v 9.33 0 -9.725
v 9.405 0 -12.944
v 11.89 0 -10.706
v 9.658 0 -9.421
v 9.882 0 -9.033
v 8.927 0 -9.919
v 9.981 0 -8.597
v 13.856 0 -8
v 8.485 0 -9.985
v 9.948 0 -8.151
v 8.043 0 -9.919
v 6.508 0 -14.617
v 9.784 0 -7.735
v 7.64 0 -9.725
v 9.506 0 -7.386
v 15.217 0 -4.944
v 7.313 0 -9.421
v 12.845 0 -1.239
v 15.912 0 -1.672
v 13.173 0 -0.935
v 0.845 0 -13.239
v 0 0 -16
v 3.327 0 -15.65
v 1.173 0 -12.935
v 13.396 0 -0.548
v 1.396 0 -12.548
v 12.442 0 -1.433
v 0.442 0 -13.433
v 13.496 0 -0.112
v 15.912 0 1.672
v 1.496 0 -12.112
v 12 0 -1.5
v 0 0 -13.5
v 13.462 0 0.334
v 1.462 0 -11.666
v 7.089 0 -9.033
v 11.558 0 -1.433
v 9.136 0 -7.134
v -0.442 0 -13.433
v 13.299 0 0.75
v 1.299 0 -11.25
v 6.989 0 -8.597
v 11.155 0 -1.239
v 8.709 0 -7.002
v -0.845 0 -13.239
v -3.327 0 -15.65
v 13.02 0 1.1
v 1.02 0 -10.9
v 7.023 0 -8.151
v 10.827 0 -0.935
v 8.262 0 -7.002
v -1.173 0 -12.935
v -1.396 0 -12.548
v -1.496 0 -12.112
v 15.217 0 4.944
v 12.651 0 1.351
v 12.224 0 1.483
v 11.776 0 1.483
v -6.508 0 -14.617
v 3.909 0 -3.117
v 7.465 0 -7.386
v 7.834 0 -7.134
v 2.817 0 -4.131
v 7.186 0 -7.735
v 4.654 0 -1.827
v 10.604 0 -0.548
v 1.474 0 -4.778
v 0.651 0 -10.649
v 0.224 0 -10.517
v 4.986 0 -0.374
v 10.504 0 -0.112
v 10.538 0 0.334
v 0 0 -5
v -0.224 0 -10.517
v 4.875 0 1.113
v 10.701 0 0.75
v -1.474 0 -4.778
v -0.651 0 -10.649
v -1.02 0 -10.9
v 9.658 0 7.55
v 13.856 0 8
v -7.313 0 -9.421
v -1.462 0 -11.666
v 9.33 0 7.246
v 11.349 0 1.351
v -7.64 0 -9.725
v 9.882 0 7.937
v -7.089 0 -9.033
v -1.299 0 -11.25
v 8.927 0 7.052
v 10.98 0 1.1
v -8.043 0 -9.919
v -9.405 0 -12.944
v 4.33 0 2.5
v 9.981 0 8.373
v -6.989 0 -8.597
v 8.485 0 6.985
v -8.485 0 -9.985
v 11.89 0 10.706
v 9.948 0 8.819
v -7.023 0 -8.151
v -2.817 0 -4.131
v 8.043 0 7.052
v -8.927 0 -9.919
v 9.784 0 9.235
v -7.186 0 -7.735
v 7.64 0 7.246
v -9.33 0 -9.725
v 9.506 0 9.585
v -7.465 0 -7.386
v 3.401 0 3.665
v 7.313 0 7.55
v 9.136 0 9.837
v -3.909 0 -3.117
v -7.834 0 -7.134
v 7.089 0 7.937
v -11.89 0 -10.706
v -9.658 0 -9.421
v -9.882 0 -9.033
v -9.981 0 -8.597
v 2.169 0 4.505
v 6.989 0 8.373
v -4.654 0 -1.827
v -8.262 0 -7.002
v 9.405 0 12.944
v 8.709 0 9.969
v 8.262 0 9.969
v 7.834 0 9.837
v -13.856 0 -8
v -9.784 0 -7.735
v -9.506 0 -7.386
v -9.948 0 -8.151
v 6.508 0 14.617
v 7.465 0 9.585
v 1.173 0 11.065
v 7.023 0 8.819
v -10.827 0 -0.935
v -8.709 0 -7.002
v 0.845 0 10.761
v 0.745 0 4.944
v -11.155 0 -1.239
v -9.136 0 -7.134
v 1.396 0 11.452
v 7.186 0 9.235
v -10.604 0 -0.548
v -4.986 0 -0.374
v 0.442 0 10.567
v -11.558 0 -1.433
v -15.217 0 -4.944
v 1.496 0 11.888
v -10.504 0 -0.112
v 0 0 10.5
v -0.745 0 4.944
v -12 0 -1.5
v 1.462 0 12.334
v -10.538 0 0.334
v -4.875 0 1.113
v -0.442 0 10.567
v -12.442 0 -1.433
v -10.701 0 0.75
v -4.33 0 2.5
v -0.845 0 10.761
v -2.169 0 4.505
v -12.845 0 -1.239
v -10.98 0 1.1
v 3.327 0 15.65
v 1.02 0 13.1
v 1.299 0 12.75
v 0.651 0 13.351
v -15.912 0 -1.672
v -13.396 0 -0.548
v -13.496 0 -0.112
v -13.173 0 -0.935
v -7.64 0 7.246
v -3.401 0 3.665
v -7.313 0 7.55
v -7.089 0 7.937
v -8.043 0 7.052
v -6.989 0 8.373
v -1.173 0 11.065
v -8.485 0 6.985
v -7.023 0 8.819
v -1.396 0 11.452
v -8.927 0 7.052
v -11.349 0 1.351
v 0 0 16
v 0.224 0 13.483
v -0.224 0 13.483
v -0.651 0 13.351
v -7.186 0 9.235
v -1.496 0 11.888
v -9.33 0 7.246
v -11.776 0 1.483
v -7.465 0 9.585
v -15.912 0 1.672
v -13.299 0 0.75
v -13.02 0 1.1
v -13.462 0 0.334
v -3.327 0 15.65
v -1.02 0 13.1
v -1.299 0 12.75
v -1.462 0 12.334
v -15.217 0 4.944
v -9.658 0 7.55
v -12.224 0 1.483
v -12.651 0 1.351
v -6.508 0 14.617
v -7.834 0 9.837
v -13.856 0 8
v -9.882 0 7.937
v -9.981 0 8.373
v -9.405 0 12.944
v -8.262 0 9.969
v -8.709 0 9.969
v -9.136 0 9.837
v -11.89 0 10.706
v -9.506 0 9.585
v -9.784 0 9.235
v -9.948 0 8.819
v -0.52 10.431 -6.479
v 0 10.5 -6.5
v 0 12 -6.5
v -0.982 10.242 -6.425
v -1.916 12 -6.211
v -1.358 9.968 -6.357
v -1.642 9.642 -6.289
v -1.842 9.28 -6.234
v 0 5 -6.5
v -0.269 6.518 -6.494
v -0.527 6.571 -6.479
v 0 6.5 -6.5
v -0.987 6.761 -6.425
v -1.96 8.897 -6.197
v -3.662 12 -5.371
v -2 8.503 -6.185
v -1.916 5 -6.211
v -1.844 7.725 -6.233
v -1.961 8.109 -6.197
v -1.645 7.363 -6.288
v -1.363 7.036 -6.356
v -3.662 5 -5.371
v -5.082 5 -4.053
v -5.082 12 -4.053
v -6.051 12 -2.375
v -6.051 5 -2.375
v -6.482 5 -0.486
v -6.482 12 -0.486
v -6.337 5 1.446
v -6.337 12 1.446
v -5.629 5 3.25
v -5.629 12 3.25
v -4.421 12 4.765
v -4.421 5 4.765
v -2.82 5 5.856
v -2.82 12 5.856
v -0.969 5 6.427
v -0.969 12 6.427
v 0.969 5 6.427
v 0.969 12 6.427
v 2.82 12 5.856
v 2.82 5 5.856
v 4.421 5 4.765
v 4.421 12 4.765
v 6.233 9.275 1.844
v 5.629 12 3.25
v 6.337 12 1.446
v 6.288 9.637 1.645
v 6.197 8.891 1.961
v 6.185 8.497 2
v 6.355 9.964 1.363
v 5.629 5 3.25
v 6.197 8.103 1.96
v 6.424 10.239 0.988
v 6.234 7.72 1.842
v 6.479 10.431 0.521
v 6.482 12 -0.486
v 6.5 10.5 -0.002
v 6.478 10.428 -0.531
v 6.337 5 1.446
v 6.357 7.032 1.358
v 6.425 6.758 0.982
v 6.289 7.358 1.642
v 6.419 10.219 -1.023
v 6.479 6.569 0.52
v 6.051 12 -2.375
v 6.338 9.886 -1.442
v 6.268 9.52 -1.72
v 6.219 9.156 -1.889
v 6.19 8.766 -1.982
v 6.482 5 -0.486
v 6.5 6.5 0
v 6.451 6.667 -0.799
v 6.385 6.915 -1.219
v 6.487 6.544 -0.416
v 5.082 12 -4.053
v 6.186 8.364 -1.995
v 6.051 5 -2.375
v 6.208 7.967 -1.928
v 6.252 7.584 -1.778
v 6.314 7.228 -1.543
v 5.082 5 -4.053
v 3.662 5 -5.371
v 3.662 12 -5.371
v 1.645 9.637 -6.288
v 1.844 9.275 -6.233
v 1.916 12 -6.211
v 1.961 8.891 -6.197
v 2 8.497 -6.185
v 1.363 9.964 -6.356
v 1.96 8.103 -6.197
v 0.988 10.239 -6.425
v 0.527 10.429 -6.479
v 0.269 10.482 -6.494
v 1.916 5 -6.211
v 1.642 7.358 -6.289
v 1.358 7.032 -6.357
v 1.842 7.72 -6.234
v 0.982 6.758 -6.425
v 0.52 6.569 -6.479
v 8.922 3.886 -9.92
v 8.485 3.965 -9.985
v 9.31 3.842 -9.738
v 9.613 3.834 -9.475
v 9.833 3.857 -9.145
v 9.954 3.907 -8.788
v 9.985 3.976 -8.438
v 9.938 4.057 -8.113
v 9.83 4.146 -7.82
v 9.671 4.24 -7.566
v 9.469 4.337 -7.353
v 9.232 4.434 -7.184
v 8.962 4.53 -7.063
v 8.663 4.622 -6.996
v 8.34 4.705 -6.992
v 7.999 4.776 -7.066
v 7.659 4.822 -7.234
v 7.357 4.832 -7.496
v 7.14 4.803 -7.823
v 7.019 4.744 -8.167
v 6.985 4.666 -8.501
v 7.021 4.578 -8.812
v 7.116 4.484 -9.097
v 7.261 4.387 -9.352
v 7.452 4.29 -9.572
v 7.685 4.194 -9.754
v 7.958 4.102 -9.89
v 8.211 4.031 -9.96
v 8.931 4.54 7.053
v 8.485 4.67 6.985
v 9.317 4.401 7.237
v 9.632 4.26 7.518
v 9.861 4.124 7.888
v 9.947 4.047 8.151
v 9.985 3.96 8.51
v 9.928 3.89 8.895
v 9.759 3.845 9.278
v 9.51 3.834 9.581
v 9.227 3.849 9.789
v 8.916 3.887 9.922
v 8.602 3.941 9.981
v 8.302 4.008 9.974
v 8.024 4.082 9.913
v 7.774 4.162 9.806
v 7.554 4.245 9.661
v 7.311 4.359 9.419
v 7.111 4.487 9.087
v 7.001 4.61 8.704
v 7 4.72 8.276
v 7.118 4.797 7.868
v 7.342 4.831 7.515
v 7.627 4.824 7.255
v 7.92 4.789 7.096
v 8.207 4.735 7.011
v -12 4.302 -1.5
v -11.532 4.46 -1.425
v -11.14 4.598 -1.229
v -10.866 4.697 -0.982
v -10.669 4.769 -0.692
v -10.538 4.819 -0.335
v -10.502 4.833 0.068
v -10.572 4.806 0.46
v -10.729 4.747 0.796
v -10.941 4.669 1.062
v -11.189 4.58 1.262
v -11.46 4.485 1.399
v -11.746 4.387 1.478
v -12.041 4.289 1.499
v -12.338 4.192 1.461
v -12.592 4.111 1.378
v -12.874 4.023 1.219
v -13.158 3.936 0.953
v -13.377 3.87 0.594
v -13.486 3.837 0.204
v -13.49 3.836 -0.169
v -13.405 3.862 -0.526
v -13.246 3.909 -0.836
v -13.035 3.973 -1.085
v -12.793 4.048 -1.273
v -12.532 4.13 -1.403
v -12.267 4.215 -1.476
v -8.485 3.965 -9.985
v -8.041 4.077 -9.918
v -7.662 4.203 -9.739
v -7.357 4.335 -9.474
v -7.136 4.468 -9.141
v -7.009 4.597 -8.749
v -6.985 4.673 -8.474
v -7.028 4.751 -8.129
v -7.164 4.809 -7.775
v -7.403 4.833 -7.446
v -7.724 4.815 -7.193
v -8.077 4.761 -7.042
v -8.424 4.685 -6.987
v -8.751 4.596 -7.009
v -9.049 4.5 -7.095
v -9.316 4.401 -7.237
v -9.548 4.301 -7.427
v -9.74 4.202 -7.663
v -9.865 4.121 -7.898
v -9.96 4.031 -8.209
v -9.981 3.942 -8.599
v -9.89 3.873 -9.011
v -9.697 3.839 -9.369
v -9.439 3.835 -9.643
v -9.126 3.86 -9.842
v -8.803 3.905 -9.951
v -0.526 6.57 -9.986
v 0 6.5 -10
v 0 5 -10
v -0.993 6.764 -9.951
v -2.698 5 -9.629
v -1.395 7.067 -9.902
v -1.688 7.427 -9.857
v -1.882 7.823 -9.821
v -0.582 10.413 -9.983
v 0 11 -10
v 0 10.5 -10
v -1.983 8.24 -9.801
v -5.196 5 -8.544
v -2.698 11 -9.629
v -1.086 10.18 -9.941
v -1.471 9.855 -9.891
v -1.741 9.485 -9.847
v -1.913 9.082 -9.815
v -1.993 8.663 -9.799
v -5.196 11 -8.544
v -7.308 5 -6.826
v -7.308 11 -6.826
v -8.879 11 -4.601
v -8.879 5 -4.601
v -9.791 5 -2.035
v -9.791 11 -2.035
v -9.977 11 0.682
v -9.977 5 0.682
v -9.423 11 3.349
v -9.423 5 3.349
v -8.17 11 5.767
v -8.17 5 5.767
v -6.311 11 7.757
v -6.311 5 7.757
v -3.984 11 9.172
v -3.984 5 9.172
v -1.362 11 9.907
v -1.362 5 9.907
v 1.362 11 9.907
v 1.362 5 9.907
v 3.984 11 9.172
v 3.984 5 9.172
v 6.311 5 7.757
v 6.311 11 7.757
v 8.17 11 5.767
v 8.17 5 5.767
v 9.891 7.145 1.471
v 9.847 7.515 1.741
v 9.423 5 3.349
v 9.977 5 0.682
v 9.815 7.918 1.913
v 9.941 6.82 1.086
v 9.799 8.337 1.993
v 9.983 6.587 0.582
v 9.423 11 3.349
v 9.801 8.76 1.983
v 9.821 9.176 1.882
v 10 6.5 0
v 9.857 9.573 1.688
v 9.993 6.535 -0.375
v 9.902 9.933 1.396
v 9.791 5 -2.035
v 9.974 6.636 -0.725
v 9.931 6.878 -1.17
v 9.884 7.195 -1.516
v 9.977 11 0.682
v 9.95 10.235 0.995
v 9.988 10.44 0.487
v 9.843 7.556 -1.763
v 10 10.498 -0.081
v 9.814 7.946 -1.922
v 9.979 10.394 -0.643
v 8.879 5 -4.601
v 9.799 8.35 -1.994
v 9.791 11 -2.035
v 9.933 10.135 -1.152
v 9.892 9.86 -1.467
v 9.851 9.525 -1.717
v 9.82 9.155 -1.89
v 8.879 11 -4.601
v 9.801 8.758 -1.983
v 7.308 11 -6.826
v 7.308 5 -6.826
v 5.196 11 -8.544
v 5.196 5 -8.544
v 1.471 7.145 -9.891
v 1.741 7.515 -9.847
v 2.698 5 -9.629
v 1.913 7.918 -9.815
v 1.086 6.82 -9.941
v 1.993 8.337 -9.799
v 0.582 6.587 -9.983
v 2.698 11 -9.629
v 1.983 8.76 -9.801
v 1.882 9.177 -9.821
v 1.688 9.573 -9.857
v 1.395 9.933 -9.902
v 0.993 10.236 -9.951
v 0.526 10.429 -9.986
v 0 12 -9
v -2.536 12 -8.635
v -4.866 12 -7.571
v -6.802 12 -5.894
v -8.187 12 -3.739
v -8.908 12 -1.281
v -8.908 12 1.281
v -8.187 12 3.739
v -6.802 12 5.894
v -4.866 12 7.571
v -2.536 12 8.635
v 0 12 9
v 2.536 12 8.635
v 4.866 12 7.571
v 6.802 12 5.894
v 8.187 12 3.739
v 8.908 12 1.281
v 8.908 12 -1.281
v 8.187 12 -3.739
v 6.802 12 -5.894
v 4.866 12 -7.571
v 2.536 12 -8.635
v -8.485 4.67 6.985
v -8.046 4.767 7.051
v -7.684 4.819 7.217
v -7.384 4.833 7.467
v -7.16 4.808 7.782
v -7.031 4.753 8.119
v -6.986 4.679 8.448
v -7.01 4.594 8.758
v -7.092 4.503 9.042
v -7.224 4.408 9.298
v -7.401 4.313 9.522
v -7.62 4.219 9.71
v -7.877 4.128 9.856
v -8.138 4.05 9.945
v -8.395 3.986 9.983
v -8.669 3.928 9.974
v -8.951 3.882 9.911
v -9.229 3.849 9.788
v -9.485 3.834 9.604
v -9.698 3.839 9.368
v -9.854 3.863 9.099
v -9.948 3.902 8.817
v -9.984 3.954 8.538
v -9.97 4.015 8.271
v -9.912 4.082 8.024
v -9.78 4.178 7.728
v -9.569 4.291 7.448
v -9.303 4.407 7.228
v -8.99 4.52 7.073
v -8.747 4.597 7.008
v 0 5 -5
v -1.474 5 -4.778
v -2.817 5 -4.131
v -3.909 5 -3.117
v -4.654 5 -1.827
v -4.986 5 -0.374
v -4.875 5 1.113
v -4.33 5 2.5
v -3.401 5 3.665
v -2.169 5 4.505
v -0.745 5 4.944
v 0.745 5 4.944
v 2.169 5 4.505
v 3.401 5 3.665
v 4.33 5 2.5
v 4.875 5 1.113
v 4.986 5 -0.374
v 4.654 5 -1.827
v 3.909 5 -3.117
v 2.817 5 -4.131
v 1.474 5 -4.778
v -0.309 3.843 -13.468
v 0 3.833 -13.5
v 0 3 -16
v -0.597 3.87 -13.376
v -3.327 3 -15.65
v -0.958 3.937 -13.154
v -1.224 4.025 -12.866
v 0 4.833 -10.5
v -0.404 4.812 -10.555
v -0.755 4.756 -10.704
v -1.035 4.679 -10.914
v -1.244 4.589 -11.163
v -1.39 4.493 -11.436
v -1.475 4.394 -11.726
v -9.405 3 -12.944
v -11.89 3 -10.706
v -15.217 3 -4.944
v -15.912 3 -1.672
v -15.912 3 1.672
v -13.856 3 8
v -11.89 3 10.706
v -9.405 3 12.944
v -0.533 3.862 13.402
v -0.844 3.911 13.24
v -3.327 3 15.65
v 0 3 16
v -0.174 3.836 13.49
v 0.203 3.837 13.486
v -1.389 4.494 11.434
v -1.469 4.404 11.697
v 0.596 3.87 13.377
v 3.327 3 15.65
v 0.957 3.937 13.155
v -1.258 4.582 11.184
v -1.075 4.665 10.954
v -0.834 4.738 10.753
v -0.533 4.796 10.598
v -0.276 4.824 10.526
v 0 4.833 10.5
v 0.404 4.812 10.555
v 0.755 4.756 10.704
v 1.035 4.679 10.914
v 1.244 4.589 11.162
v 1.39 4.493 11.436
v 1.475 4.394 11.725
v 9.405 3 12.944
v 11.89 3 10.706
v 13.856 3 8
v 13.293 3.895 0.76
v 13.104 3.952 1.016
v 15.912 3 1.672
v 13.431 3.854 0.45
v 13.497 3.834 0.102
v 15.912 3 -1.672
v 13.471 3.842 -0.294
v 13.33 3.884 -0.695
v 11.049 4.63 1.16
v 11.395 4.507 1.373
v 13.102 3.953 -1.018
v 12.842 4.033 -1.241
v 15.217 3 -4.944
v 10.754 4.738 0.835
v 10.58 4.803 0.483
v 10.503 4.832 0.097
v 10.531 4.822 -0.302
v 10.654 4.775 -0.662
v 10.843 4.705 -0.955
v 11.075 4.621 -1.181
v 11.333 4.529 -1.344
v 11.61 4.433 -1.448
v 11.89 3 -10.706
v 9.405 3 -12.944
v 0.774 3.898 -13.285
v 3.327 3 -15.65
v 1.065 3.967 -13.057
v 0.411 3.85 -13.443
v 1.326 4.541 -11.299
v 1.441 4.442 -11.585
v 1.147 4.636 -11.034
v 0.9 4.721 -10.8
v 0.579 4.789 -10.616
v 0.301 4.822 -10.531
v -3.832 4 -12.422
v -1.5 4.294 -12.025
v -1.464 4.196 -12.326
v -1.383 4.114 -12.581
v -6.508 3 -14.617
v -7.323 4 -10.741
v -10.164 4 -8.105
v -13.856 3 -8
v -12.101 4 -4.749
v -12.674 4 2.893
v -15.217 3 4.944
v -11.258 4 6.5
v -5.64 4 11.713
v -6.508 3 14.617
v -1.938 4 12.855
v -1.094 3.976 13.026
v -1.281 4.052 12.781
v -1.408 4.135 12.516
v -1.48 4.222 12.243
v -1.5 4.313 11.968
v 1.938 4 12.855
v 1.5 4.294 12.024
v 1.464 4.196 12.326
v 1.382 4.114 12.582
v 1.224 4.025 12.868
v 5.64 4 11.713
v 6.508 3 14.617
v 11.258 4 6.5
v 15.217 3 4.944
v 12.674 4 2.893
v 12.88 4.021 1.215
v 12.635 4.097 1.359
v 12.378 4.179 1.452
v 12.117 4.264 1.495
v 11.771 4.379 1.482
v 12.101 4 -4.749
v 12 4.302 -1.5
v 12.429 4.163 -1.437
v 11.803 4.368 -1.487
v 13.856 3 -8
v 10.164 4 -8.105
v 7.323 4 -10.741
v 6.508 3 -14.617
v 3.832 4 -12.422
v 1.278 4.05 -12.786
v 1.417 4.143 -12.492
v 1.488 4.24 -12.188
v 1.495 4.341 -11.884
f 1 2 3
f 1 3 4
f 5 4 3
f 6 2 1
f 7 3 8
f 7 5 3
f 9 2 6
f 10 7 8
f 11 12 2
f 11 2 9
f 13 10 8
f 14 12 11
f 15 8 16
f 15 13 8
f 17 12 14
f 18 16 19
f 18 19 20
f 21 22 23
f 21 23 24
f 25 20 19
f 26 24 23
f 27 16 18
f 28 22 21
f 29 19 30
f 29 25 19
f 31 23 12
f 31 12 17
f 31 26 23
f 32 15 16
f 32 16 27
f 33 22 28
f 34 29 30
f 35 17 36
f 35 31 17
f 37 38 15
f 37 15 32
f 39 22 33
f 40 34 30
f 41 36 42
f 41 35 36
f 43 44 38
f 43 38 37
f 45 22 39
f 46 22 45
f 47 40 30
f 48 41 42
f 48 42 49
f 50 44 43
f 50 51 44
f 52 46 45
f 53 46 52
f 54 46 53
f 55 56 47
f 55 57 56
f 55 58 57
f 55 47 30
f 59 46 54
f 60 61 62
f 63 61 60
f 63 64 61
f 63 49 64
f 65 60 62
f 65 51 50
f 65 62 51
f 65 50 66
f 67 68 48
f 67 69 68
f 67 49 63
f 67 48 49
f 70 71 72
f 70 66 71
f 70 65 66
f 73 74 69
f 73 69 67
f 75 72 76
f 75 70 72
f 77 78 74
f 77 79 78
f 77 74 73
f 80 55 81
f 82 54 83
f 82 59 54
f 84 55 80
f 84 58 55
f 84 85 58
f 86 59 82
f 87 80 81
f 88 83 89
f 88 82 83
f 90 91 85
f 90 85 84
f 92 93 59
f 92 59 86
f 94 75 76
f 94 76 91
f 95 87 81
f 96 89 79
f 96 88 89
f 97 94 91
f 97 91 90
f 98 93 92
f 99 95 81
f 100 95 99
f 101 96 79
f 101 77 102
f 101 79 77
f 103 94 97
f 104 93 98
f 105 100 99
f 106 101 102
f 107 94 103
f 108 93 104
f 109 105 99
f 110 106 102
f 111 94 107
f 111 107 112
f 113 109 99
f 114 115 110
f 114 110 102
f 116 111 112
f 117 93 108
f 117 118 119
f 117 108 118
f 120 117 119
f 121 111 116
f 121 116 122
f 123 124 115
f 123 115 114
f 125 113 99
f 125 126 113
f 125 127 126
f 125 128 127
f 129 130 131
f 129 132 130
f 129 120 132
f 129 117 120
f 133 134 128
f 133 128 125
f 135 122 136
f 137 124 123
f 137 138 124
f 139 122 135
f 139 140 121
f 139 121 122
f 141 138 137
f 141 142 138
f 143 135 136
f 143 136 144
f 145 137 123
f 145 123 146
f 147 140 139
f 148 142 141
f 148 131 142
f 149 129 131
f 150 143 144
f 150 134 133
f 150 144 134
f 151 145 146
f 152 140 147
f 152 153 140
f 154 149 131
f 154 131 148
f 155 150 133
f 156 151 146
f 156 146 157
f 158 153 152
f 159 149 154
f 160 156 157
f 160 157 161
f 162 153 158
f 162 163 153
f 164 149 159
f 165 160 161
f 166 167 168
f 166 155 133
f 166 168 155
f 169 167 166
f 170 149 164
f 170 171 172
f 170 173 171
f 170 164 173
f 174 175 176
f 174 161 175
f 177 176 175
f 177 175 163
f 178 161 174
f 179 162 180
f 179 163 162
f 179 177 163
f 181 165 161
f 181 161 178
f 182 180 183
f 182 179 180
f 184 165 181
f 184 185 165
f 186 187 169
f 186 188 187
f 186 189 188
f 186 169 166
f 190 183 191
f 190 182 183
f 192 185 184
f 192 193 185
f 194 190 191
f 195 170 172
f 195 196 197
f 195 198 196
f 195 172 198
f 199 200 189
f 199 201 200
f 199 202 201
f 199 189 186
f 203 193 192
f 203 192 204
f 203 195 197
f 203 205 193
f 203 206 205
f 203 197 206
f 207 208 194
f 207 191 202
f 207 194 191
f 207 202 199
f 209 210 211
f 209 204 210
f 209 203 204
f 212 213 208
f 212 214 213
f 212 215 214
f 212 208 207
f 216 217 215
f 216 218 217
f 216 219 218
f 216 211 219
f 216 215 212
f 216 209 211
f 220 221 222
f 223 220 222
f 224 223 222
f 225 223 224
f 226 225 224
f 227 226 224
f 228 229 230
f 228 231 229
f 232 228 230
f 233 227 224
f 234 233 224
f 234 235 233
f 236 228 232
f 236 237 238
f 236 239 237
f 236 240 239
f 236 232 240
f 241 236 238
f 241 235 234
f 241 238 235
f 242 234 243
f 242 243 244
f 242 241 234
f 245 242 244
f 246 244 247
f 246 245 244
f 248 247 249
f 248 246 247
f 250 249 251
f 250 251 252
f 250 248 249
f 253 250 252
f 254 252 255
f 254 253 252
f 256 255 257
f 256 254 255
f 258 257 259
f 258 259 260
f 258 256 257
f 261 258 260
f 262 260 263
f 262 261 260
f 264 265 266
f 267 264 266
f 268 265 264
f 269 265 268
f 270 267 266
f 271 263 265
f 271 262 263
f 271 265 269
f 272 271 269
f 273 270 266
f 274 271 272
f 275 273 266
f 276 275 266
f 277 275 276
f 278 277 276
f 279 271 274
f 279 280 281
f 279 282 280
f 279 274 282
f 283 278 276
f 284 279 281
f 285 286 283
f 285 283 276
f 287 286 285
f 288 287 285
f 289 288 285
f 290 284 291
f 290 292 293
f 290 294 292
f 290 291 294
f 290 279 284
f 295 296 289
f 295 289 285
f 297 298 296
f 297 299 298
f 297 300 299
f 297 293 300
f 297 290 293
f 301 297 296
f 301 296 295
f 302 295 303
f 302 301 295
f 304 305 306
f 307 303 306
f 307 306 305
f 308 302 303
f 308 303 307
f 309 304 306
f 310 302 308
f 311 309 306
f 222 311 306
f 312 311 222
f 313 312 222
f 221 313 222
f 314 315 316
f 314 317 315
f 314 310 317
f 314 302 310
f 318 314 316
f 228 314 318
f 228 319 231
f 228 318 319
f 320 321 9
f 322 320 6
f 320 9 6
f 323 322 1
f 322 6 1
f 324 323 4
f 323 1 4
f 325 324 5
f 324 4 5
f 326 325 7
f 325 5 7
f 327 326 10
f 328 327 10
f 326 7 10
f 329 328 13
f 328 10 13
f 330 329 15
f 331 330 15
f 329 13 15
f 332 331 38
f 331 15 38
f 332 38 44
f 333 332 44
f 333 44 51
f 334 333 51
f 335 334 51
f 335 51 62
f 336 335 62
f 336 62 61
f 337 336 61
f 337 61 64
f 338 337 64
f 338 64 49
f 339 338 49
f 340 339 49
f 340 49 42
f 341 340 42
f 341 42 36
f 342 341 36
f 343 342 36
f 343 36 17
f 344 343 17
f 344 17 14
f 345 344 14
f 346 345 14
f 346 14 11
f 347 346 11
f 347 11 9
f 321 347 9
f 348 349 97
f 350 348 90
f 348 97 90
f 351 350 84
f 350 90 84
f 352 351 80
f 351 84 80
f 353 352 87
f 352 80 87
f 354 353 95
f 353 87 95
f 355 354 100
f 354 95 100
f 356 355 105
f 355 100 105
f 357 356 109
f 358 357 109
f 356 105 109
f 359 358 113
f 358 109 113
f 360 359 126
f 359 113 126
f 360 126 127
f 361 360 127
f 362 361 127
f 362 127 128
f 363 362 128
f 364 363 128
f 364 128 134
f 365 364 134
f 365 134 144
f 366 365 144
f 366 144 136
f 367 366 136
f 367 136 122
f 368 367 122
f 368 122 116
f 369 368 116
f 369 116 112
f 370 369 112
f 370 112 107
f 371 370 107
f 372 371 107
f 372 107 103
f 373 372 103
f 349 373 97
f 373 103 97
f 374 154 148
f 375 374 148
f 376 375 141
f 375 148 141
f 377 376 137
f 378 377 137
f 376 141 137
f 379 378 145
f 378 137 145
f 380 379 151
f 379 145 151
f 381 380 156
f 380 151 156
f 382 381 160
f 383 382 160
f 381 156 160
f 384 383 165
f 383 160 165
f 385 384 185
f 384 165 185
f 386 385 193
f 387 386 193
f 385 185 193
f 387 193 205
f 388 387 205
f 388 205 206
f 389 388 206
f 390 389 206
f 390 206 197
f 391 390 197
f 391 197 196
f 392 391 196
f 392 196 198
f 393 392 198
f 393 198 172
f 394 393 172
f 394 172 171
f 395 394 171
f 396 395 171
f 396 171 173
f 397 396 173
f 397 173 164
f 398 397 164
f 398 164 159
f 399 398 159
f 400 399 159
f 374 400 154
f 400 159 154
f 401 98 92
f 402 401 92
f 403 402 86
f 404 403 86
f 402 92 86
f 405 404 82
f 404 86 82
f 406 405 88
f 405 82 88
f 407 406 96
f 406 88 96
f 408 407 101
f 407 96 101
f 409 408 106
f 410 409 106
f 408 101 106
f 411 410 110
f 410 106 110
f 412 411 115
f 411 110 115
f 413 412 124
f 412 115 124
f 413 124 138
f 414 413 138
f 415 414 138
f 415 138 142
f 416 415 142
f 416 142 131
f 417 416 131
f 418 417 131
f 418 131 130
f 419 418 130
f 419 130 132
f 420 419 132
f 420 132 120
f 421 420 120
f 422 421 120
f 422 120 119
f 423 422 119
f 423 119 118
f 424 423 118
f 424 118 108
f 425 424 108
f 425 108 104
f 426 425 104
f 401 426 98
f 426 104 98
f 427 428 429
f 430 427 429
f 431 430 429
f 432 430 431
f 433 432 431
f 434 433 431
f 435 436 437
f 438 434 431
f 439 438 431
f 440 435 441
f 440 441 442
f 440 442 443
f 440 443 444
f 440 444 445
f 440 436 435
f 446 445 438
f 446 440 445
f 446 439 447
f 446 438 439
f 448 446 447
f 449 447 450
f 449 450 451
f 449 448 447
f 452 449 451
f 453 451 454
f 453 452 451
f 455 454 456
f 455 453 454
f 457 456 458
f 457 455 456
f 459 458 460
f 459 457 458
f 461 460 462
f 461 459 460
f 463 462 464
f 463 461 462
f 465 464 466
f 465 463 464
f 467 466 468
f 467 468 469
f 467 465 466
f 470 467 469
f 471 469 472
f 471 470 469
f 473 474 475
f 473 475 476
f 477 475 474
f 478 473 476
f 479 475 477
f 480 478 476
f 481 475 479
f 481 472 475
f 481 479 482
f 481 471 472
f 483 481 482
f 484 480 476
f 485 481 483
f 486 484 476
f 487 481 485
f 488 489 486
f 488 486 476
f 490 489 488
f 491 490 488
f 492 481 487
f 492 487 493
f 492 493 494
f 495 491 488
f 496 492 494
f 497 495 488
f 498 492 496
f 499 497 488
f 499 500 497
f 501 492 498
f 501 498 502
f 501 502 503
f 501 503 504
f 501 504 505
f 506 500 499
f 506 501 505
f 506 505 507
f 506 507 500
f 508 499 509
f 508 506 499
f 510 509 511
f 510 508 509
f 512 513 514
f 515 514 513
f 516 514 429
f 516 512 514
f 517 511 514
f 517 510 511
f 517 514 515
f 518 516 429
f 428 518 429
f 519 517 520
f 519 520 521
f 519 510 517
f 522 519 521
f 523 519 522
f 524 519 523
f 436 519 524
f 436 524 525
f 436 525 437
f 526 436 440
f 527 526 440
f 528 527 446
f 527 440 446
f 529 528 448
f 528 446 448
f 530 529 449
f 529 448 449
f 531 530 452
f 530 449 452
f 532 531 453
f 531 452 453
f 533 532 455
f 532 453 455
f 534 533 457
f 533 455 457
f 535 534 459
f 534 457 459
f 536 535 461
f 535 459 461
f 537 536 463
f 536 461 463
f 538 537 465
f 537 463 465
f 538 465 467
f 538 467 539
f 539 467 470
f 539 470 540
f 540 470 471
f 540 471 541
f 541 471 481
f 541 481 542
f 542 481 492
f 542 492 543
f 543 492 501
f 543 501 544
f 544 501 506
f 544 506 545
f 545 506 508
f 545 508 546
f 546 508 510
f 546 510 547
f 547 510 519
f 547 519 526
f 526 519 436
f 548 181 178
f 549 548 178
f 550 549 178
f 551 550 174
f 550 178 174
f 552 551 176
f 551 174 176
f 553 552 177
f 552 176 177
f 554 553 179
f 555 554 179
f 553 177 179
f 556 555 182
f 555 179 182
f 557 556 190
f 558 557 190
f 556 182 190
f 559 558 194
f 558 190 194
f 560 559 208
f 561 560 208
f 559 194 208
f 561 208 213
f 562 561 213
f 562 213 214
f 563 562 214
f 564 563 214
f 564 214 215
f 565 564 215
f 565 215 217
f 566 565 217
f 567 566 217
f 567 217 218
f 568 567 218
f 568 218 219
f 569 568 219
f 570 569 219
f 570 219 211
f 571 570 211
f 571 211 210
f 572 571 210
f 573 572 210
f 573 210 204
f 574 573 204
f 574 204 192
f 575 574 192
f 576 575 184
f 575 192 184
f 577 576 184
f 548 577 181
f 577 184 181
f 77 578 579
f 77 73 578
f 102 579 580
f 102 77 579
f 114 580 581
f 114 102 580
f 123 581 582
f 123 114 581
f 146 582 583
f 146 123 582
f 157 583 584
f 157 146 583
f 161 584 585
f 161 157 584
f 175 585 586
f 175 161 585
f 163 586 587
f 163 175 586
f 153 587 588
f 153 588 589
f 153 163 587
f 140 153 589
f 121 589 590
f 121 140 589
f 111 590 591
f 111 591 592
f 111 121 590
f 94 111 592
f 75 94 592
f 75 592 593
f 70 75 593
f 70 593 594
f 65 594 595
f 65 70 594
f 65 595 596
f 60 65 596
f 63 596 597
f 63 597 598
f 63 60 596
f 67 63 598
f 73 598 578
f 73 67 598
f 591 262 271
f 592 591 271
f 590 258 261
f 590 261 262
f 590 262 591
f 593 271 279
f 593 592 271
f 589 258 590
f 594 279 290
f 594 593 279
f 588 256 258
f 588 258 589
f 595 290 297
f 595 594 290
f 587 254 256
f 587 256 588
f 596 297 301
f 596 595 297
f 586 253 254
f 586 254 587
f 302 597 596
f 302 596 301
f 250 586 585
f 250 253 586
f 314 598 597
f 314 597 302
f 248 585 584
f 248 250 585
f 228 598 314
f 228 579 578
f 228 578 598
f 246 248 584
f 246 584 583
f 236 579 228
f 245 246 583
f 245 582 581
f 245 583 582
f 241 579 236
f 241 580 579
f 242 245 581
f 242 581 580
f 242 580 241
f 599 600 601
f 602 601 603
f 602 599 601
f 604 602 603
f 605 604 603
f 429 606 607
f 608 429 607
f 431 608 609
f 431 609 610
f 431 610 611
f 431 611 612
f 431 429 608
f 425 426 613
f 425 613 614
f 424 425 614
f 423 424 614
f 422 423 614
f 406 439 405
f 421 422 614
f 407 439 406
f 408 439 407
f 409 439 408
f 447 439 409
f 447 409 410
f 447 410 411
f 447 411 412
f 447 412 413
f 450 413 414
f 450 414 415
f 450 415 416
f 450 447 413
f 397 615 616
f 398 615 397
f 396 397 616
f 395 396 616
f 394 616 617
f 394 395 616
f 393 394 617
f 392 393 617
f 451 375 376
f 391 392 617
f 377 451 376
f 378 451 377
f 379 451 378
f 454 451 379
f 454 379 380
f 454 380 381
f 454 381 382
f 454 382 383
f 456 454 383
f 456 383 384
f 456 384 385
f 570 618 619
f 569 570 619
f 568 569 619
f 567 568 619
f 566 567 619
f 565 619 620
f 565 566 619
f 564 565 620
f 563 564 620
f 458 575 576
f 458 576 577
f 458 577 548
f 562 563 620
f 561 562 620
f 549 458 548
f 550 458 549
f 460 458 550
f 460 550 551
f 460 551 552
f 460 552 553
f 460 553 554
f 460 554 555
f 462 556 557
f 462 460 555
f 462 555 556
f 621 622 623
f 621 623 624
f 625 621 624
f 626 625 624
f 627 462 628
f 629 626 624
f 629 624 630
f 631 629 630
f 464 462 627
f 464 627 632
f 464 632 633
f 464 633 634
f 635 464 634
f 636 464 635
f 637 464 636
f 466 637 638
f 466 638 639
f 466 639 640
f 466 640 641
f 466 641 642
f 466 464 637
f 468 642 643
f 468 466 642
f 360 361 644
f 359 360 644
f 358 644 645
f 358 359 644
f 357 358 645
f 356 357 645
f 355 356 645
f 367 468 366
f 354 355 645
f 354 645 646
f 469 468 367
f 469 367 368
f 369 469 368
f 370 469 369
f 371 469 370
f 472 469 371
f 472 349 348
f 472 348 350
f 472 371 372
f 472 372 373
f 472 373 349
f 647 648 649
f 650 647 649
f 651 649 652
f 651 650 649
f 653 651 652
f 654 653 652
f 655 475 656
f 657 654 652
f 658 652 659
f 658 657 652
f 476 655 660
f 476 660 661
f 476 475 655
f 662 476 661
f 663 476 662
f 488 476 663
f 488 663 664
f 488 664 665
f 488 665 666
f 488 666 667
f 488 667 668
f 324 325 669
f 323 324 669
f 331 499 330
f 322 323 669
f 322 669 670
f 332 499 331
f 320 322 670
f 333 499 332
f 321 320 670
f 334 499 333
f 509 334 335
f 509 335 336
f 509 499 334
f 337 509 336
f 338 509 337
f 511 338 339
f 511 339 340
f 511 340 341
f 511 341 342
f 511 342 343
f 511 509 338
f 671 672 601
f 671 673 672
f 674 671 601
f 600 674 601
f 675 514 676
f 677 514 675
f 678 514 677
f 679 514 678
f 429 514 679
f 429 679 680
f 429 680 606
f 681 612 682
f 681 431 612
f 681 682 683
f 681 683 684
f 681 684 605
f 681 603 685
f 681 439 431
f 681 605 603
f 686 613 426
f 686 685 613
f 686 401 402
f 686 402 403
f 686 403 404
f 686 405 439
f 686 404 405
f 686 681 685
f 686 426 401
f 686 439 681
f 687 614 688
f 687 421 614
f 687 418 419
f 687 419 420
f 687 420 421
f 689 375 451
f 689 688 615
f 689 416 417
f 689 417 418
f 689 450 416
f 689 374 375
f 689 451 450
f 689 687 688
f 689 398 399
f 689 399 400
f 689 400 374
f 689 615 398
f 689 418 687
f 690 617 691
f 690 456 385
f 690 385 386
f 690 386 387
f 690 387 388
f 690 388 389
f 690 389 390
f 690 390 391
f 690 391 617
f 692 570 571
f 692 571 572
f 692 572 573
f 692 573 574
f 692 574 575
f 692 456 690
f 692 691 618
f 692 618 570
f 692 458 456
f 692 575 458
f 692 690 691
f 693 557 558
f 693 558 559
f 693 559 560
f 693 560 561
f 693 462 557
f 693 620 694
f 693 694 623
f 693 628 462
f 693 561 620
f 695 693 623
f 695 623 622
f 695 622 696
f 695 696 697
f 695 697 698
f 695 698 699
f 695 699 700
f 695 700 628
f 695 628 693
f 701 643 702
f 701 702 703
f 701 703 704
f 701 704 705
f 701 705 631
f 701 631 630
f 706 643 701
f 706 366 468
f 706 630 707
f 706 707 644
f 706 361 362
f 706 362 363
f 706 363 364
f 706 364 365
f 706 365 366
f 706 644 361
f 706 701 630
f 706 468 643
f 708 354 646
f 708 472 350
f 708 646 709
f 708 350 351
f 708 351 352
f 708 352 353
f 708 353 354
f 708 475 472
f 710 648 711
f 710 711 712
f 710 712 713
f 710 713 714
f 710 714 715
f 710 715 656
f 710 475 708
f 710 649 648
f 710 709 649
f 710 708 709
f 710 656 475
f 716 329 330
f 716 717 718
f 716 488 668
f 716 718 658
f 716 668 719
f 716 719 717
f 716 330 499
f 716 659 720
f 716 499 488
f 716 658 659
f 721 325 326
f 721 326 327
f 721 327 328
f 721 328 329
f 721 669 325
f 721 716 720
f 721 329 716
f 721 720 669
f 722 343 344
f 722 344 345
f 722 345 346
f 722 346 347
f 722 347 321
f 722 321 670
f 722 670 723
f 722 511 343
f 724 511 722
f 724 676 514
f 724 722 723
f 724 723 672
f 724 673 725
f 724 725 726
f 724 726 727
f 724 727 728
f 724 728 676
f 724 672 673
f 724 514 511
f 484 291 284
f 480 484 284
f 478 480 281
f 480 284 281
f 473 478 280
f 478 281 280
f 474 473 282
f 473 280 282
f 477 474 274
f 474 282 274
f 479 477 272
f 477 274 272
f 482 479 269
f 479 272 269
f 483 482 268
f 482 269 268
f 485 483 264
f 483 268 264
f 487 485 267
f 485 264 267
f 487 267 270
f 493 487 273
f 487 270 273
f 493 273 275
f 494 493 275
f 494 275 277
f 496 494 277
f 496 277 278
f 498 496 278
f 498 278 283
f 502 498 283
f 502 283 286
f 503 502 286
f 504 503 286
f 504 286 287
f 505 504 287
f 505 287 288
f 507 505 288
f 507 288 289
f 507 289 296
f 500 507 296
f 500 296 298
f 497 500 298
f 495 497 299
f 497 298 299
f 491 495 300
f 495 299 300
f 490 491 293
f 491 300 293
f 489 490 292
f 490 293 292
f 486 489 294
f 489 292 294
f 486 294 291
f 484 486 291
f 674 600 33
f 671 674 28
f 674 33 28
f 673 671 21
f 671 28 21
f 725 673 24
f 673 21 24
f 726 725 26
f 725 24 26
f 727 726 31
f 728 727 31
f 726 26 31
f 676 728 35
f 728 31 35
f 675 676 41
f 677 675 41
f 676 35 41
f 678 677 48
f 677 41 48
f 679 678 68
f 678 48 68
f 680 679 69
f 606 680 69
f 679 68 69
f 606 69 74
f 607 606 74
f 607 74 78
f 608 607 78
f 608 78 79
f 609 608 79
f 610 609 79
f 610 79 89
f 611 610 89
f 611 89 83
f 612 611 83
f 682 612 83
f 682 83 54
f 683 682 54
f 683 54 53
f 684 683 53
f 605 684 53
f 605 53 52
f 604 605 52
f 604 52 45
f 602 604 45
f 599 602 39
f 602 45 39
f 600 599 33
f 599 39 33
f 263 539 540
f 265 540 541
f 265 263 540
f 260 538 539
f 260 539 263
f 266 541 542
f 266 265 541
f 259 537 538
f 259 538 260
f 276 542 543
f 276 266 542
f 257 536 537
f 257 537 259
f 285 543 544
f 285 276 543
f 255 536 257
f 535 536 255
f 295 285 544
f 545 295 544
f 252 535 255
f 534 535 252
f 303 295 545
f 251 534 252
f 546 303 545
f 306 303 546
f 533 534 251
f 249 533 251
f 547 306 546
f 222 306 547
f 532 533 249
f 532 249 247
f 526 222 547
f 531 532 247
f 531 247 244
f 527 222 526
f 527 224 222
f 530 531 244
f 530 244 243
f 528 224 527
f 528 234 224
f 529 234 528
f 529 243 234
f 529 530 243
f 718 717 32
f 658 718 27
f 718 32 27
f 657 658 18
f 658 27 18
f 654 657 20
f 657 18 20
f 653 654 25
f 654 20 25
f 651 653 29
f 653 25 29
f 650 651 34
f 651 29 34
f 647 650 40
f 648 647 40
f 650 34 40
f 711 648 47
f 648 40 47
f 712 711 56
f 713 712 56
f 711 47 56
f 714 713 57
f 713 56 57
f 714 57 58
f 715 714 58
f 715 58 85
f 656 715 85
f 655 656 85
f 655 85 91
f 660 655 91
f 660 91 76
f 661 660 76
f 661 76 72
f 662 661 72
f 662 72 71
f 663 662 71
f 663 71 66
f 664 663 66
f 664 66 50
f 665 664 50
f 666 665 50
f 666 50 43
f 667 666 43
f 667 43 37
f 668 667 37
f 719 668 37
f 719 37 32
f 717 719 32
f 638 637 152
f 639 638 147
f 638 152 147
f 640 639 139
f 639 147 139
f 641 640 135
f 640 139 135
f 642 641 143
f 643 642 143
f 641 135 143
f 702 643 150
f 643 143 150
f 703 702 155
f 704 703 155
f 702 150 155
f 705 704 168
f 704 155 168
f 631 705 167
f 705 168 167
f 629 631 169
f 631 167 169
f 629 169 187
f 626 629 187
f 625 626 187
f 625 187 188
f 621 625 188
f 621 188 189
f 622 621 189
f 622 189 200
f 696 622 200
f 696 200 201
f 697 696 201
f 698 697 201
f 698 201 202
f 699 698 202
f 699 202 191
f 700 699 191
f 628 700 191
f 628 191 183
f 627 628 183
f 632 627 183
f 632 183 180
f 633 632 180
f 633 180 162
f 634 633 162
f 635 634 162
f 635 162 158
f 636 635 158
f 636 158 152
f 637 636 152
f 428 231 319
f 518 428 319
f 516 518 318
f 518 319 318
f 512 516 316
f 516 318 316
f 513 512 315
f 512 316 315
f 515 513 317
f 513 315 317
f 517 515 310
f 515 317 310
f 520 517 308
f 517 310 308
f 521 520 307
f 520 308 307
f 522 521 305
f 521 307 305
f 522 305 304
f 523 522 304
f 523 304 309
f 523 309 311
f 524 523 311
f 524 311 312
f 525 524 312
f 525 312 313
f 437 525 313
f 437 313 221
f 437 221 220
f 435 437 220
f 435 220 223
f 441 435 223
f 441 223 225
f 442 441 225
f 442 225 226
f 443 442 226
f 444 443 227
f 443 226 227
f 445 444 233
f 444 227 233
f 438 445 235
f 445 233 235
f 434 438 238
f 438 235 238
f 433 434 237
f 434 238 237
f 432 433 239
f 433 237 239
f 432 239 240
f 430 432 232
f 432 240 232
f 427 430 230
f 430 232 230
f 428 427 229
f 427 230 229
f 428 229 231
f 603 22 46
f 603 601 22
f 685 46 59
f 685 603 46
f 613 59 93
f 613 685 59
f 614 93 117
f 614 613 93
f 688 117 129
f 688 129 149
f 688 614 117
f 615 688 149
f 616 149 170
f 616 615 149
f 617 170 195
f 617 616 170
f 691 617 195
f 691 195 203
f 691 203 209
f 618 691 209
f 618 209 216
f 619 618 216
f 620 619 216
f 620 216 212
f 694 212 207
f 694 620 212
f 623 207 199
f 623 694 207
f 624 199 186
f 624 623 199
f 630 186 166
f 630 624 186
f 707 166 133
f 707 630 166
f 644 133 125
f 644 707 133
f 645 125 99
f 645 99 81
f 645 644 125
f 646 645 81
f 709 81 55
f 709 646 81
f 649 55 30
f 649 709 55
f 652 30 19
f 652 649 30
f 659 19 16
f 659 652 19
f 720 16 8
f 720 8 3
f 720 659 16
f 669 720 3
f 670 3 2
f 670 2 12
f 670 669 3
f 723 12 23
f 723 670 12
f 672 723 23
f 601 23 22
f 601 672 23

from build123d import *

# Parameters (mm, degrees)
SKETCH2_R          = 1.5
CUT_EXTRUDE1_DEPTH = 10
SKETCH3_R          = 2
CUT_EXTRUDE2_DEPTH = 26.612497075
CIRPATTERN1_COUNT  = 2
CIRPATTERN1_ANGLE  = 90
CHAMFER1_SIZE      = 1


with BuildPart() as part:
    # Sketch1 → Revolve1 (revolve)
    with BuildSketch(Plane.XY, mode=Mode.PRIVATE) as revolve1_sk:
        Polygon((10, 12), (6.5, 12), (6.5, 5), (5, 5), (5, 0), (16, 0), (16, 3), (10, 5), align=None)
    revolve(revolve1_sk.sketch.rotate(Axis((0, 0, 0), (0, 1, 0)), 90), axis=Axis((0, 0, 0), (0, 1, 0)))

    # Sketch2 → Cut-Extrude1 (cut)
    with BuildSketch(Plane.XZ):
        with Locations(Location((0, 12, 0), (0, 0, 270))):
            Circle(SKETCH2_R)
        with Locations(Location((8.485281374, 8.485281374, 0), (0, 0, 270))):
            Circle(SKETCH2_R)
        with Locations(Location((12, 0, 0), (0, 0, 270))):
            Circle(SKETCH2_R)
        with Locations(Location((8.485281374, -8.485281374, 0), (0, 0, 270))):
            Circle(SKETCH2_R)
        with Locations(Location((0, -12, 0), (0, 0, 270))):
            Circle(SKETCH2_R)
        with Locations(Location((-8.485281374, -8.485281374, 0), (0, 0, 270))):
            Circle(SKETCH2_R)
        with Locations(Location((-12, 0, 0), (0, 0, 270))):
            Circle(SKETCH2_R)
        with Locations(Location((-8.485281374, 8.485281374, 0), (0, 0, 270))):
            Circle(SKETCH2_R)
    extrude(amount=-CUT_EXTRUDE1_DEPTH, mode=Mode.SUBTRACT)

    # Sketch3 → Cut-Extrude2 (cut, through all)
    with BuildSketch(Plane.XY):
        with Locations(Location((0, 8.5, 0), (0, 0, 270.000000001))):
            Circle(SKETCH3_R)
    cut_extrude2 = extrude(amount=-CUT_EXTRUDE2_DEPTH, mode=Mode.SUBTRACT)

    # CirPattern1: Cut-Extrude2 ×2 about axis
    cirpattern1_axis = Axis((0, 12, 0), (0, -1, 0))
    for i in range(1, CIRPATTERN1_COUNT):
        add(cut_extrude2.rotate(cirpattern1_axis, i * CIRPATTERN1_ANGLE / (CIRPATTERN1_COUNT - 1)), mode=Mode.SUBTRACT)

    # Chamfer1
    chamfer1_edges = [part.edges().sort_by_distance(p)[0] for p in [
        (0, 12, 10),
    ]]
    chamfer(chamfer1_edges, length=CHAMFER1_SIZE)


solid = part.part
